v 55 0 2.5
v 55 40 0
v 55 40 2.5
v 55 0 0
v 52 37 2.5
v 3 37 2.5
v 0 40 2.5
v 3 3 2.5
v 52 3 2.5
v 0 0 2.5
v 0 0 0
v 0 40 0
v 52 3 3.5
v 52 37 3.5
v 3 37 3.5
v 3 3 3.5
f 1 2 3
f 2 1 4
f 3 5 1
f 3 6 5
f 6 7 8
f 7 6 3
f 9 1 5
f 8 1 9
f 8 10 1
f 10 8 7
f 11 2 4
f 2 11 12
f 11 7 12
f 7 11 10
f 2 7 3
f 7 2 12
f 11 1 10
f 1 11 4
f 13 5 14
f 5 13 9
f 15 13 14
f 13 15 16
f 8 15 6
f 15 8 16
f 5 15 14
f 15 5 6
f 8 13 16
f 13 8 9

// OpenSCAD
// Lid, correct (issue #436): the plate and the rim strips are unioned, so the
// render reaches the declared 3.5 mm stack.
lid_base_thickness = 1.5;
rim_drop = 1.0;
skirt_height = 1.0;
lid_base = lid_base_thickness + rim_drop;
total_height = lid_base + skirt_height;

union() {
  cube([55, 40, lid_base]);
  translate([3, 3, lid_base]) cube([49, 34, skirt_height]);
}
